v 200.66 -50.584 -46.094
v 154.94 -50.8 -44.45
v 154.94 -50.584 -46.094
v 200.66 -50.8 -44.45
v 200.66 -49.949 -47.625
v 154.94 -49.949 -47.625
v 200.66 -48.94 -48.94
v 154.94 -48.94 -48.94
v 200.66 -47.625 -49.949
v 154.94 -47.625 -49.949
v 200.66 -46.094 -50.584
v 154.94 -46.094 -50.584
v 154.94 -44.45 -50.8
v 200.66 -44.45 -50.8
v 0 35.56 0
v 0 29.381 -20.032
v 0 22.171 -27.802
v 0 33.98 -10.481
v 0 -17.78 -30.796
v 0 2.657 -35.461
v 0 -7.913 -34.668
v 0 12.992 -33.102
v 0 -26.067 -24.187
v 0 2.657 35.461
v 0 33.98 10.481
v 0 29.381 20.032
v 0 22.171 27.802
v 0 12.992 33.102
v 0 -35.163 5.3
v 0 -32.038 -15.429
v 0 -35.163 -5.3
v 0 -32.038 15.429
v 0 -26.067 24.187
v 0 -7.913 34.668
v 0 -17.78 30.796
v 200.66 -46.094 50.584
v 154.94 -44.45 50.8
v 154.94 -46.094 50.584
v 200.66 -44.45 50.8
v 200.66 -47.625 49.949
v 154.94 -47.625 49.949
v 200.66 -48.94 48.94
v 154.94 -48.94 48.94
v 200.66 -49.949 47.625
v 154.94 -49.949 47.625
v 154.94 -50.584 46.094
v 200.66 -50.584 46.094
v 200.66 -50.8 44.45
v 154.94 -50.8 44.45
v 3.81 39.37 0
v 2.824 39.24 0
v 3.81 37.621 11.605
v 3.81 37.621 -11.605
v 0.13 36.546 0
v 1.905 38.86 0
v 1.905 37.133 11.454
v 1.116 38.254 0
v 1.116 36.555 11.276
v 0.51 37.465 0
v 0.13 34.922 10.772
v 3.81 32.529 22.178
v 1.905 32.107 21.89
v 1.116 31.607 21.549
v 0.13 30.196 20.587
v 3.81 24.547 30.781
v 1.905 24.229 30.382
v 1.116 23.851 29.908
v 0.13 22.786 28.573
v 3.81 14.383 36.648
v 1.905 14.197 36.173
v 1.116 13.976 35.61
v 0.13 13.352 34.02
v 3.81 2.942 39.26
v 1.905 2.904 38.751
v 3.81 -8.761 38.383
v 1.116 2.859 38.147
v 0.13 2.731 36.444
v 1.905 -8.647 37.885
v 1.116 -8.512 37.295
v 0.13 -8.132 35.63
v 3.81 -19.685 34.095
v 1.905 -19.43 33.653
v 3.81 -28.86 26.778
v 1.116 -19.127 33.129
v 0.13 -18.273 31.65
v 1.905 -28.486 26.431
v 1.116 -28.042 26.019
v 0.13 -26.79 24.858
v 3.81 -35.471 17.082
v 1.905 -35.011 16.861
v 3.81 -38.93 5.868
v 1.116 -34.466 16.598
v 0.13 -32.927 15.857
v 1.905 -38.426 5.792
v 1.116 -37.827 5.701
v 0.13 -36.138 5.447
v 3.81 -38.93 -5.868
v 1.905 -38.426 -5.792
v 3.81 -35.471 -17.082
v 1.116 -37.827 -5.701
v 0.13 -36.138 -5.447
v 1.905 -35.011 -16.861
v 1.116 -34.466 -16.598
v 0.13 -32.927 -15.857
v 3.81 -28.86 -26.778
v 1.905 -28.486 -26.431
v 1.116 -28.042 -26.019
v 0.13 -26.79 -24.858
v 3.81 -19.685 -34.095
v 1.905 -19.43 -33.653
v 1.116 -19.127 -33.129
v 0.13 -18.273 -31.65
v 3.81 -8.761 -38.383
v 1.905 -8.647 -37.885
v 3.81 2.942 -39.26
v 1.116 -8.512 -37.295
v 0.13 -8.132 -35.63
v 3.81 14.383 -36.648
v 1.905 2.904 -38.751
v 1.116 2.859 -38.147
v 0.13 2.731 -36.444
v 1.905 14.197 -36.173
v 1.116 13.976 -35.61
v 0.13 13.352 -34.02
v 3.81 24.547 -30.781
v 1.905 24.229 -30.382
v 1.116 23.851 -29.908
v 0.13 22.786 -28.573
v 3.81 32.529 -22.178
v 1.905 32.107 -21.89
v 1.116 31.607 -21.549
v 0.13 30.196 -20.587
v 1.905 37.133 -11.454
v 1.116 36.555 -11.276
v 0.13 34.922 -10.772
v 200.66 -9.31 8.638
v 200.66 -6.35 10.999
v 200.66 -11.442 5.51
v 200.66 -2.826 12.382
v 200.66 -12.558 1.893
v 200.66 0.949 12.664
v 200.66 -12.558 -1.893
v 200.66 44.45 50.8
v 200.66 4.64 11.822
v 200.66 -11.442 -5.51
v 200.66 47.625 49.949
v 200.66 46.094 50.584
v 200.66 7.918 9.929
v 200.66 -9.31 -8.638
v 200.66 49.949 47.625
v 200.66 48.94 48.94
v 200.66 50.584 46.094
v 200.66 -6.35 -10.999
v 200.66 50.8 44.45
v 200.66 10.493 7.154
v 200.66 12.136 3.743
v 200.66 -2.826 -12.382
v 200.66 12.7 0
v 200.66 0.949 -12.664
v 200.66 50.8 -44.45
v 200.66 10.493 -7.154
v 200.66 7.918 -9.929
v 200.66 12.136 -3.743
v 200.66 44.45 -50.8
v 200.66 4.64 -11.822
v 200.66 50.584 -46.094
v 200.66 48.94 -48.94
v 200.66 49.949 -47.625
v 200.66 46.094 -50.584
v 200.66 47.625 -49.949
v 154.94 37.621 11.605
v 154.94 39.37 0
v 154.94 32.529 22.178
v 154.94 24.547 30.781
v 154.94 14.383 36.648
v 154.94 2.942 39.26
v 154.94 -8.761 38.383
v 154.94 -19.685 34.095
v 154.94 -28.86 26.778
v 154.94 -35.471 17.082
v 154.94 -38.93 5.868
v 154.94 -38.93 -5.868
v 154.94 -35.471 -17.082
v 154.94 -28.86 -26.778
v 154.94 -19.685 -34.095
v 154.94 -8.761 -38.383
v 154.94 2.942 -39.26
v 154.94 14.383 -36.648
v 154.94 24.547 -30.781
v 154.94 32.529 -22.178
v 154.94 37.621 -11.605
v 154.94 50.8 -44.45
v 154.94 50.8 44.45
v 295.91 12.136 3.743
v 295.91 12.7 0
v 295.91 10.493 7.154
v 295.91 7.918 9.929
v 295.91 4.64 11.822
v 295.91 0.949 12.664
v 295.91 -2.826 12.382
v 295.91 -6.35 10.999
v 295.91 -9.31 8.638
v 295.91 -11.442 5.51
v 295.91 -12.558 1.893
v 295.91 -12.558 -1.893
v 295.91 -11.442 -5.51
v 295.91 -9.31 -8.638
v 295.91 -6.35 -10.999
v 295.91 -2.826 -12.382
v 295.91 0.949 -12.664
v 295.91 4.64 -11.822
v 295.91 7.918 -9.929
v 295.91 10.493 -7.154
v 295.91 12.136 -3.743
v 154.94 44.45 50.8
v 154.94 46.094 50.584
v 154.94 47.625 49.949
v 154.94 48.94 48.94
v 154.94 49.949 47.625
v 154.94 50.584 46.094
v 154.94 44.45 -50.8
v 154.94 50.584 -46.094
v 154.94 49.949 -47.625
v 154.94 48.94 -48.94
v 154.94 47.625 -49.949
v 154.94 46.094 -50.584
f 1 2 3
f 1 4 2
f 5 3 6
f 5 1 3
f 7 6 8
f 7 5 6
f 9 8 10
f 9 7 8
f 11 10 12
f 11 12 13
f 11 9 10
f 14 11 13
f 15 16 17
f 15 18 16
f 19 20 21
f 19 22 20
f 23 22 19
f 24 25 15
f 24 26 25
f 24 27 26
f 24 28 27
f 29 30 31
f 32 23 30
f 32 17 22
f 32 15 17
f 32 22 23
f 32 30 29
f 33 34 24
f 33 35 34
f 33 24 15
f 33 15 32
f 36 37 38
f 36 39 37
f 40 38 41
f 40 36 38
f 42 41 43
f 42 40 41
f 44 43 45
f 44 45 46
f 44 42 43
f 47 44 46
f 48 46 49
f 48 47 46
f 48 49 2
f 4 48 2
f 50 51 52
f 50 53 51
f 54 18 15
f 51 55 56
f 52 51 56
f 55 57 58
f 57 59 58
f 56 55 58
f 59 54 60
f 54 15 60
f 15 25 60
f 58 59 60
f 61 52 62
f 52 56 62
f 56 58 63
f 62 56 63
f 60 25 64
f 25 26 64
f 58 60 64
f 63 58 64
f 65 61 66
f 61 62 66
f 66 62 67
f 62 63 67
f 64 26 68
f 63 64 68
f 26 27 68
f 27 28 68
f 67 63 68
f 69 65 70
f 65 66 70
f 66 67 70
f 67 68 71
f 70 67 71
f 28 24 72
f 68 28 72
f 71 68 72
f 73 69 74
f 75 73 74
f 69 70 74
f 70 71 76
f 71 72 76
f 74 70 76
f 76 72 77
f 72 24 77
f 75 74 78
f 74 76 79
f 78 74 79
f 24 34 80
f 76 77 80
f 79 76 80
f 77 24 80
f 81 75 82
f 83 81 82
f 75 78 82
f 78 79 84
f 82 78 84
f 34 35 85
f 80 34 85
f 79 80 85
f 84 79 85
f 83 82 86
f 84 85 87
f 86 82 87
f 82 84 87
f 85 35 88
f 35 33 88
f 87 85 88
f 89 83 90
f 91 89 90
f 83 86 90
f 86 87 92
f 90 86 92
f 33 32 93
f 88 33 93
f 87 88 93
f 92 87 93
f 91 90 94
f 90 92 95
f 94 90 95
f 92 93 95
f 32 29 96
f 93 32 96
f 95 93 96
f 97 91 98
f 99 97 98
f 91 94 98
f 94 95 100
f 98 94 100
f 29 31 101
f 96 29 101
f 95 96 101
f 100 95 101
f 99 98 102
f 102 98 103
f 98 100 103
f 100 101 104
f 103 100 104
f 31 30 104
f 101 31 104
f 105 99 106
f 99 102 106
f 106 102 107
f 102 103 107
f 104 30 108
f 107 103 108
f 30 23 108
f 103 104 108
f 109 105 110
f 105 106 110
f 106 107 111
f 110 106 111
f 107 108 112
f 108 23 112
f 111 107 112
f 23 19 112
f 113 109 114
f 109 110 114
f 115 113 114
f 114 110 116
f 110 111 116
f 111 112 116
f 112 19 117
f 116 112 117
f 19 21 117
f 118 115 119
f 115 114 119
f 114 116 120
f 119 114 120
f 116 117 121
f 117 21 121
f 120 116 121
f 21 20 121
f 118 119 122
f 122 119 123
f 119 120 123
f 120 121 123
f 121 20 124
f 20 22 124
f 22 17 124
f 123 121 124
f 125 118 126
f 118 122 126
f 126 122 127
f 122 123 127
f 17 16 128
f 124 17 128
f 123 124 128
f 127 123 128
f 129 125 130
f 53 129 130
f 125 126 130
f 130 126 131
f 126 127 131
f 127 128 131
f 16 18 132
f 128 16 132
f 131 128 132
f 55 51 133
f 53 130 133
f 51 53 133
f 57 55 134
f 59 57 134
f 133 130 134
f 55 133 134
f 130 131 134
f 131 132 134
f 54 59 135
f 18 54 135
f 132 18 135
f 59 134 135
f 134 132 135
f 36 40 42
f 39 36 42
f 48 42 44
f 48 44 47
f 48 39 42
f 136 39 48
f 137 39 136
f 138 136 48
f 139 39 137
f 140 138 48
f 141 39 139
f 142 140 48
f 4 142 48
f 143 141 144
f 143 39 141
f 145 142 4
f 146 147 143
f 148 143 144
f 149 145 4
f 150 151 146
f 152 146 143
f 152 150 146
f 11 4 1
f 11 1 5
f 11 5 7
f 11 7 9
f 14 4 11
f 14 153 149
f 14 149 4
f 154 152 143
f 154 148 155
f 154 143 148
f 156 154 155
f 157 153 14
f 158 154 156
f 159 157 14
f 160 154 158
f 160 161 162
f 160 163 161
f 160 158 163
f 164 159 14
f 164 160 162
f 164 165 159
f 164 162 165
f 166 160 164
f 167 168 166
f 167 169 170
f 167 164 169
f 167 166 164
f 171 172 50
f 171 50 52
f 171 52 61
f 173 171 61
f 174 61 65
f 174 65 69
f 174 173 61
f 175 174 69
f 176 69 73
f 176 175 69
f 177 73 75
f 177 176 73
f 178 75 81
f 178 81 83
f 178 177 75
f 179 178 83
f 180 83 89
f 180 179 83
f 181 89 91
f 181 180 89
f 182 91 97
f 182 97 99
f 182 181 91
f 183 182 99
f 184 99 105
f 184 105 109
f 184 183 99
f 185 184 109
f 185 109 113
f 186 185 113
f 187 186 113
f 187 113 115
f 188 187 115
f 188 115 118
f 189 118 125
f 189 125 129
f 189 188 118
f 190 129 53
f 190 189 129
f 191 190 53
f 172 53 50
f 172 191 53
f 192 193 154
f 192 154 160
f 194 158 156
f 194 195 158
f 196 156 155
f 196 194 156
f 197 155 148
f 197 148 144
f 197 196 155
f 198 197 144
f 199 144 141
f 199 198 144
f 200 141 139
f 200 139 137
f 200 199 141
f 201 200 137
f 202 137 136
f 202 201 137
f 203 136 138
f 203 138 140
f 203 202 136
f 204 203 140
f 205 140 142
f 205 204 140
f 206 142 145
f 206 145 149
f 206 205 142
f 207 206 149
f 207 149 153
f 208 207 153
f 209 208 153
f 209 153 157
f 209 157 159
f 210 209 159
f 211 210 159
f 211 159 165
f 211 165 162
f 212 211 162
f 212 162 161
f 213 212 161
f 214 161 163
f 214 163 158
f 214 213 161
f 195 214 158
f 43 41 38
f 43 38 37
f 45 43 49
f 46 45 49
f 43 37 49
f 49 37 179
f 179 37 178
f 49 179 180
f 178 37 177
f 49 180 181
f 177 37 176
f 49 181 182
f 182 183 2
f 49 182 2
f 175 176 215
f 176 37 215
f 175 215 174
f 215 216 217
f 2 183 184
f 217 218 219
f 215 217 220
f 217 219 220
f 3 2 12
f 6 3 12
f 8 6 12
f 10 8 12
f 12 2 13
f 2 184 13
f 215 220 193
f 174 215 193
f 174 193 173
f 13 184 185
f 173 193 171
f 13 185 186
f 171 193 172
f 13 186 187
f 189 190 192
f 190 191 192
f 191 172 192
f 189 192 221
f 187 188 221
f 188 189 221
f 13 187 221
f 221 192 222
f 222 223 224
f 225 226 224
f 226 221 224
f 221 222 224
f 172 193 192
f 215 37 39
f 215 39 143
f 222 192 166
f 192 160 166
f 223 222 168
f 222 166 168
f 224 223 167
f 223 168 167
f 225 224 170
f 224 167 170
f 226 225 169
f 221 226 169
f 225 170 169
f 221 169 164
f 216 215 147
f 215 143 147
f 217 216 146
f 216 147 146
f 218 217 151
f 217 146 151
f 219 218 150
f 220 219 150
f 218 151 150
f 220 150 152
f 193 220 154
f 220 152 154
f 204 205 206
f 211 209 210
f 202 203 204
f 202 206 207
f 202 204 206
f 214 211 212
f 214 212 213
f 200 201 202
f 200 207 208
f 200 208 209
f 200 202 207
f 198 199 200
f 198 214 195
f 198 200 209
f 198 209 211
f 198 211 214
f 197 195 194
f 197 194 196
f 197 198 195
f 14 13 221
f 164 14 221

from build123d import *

# Parameters (mm, degrees)
SKETCH2_W           = 101.6
SKETCH2_H           = 101.6
BOSS_EXTRUDE1_DEPTH = 45.72
FILLET1_R           = 6.35
FILLET2_R           = 3.81


with BuildPart() as part:
    # Sketch1 → Revolve1 (revolve)
    with BuildSketch(Plane.XY):
        Polygon((154.94, 12.7), (295.91, 12.7), (295.91, 0), (0, 0), (0, 39.37), (154.94, 39.37), align=None)
    revolve(axis=Axis((-49.711428571, 0, 0), (1, 0, 0)))

    # Sketch2 → Boss-Extrude1 (add)
    with BuildSketch(Plane(origin=(154.94, 0, 0), x_dir=(0, 0, -1), z_dir=(1, 0, 0))):
        Rectangle(SKETCH2_W, SKETCH2_H)
    extrude(amount=BOSS_EXTRUDE1_DEPTH)

    # Fillet1
    fillet1_edges = [part.edges().sort_by_distance(p)[0] for p in [
        (177.8, 50.8, 50.8),
        (177.8, -50.8, 50.8),
        (177.8, -50.8, -50.8),
        (177.8, 50.8, -50.8),
    ]]
    fillet(fillet1_edges, radius=FILLET1_R)

    # Fillet2
    fillet2_edges = [part.edges().sort_by_distance(p)[0] for p in [
        (0, -39.37, 0),
    ]]
    fillet(fillet2_edges, radius=FILLET2_R)


solid = part.part
